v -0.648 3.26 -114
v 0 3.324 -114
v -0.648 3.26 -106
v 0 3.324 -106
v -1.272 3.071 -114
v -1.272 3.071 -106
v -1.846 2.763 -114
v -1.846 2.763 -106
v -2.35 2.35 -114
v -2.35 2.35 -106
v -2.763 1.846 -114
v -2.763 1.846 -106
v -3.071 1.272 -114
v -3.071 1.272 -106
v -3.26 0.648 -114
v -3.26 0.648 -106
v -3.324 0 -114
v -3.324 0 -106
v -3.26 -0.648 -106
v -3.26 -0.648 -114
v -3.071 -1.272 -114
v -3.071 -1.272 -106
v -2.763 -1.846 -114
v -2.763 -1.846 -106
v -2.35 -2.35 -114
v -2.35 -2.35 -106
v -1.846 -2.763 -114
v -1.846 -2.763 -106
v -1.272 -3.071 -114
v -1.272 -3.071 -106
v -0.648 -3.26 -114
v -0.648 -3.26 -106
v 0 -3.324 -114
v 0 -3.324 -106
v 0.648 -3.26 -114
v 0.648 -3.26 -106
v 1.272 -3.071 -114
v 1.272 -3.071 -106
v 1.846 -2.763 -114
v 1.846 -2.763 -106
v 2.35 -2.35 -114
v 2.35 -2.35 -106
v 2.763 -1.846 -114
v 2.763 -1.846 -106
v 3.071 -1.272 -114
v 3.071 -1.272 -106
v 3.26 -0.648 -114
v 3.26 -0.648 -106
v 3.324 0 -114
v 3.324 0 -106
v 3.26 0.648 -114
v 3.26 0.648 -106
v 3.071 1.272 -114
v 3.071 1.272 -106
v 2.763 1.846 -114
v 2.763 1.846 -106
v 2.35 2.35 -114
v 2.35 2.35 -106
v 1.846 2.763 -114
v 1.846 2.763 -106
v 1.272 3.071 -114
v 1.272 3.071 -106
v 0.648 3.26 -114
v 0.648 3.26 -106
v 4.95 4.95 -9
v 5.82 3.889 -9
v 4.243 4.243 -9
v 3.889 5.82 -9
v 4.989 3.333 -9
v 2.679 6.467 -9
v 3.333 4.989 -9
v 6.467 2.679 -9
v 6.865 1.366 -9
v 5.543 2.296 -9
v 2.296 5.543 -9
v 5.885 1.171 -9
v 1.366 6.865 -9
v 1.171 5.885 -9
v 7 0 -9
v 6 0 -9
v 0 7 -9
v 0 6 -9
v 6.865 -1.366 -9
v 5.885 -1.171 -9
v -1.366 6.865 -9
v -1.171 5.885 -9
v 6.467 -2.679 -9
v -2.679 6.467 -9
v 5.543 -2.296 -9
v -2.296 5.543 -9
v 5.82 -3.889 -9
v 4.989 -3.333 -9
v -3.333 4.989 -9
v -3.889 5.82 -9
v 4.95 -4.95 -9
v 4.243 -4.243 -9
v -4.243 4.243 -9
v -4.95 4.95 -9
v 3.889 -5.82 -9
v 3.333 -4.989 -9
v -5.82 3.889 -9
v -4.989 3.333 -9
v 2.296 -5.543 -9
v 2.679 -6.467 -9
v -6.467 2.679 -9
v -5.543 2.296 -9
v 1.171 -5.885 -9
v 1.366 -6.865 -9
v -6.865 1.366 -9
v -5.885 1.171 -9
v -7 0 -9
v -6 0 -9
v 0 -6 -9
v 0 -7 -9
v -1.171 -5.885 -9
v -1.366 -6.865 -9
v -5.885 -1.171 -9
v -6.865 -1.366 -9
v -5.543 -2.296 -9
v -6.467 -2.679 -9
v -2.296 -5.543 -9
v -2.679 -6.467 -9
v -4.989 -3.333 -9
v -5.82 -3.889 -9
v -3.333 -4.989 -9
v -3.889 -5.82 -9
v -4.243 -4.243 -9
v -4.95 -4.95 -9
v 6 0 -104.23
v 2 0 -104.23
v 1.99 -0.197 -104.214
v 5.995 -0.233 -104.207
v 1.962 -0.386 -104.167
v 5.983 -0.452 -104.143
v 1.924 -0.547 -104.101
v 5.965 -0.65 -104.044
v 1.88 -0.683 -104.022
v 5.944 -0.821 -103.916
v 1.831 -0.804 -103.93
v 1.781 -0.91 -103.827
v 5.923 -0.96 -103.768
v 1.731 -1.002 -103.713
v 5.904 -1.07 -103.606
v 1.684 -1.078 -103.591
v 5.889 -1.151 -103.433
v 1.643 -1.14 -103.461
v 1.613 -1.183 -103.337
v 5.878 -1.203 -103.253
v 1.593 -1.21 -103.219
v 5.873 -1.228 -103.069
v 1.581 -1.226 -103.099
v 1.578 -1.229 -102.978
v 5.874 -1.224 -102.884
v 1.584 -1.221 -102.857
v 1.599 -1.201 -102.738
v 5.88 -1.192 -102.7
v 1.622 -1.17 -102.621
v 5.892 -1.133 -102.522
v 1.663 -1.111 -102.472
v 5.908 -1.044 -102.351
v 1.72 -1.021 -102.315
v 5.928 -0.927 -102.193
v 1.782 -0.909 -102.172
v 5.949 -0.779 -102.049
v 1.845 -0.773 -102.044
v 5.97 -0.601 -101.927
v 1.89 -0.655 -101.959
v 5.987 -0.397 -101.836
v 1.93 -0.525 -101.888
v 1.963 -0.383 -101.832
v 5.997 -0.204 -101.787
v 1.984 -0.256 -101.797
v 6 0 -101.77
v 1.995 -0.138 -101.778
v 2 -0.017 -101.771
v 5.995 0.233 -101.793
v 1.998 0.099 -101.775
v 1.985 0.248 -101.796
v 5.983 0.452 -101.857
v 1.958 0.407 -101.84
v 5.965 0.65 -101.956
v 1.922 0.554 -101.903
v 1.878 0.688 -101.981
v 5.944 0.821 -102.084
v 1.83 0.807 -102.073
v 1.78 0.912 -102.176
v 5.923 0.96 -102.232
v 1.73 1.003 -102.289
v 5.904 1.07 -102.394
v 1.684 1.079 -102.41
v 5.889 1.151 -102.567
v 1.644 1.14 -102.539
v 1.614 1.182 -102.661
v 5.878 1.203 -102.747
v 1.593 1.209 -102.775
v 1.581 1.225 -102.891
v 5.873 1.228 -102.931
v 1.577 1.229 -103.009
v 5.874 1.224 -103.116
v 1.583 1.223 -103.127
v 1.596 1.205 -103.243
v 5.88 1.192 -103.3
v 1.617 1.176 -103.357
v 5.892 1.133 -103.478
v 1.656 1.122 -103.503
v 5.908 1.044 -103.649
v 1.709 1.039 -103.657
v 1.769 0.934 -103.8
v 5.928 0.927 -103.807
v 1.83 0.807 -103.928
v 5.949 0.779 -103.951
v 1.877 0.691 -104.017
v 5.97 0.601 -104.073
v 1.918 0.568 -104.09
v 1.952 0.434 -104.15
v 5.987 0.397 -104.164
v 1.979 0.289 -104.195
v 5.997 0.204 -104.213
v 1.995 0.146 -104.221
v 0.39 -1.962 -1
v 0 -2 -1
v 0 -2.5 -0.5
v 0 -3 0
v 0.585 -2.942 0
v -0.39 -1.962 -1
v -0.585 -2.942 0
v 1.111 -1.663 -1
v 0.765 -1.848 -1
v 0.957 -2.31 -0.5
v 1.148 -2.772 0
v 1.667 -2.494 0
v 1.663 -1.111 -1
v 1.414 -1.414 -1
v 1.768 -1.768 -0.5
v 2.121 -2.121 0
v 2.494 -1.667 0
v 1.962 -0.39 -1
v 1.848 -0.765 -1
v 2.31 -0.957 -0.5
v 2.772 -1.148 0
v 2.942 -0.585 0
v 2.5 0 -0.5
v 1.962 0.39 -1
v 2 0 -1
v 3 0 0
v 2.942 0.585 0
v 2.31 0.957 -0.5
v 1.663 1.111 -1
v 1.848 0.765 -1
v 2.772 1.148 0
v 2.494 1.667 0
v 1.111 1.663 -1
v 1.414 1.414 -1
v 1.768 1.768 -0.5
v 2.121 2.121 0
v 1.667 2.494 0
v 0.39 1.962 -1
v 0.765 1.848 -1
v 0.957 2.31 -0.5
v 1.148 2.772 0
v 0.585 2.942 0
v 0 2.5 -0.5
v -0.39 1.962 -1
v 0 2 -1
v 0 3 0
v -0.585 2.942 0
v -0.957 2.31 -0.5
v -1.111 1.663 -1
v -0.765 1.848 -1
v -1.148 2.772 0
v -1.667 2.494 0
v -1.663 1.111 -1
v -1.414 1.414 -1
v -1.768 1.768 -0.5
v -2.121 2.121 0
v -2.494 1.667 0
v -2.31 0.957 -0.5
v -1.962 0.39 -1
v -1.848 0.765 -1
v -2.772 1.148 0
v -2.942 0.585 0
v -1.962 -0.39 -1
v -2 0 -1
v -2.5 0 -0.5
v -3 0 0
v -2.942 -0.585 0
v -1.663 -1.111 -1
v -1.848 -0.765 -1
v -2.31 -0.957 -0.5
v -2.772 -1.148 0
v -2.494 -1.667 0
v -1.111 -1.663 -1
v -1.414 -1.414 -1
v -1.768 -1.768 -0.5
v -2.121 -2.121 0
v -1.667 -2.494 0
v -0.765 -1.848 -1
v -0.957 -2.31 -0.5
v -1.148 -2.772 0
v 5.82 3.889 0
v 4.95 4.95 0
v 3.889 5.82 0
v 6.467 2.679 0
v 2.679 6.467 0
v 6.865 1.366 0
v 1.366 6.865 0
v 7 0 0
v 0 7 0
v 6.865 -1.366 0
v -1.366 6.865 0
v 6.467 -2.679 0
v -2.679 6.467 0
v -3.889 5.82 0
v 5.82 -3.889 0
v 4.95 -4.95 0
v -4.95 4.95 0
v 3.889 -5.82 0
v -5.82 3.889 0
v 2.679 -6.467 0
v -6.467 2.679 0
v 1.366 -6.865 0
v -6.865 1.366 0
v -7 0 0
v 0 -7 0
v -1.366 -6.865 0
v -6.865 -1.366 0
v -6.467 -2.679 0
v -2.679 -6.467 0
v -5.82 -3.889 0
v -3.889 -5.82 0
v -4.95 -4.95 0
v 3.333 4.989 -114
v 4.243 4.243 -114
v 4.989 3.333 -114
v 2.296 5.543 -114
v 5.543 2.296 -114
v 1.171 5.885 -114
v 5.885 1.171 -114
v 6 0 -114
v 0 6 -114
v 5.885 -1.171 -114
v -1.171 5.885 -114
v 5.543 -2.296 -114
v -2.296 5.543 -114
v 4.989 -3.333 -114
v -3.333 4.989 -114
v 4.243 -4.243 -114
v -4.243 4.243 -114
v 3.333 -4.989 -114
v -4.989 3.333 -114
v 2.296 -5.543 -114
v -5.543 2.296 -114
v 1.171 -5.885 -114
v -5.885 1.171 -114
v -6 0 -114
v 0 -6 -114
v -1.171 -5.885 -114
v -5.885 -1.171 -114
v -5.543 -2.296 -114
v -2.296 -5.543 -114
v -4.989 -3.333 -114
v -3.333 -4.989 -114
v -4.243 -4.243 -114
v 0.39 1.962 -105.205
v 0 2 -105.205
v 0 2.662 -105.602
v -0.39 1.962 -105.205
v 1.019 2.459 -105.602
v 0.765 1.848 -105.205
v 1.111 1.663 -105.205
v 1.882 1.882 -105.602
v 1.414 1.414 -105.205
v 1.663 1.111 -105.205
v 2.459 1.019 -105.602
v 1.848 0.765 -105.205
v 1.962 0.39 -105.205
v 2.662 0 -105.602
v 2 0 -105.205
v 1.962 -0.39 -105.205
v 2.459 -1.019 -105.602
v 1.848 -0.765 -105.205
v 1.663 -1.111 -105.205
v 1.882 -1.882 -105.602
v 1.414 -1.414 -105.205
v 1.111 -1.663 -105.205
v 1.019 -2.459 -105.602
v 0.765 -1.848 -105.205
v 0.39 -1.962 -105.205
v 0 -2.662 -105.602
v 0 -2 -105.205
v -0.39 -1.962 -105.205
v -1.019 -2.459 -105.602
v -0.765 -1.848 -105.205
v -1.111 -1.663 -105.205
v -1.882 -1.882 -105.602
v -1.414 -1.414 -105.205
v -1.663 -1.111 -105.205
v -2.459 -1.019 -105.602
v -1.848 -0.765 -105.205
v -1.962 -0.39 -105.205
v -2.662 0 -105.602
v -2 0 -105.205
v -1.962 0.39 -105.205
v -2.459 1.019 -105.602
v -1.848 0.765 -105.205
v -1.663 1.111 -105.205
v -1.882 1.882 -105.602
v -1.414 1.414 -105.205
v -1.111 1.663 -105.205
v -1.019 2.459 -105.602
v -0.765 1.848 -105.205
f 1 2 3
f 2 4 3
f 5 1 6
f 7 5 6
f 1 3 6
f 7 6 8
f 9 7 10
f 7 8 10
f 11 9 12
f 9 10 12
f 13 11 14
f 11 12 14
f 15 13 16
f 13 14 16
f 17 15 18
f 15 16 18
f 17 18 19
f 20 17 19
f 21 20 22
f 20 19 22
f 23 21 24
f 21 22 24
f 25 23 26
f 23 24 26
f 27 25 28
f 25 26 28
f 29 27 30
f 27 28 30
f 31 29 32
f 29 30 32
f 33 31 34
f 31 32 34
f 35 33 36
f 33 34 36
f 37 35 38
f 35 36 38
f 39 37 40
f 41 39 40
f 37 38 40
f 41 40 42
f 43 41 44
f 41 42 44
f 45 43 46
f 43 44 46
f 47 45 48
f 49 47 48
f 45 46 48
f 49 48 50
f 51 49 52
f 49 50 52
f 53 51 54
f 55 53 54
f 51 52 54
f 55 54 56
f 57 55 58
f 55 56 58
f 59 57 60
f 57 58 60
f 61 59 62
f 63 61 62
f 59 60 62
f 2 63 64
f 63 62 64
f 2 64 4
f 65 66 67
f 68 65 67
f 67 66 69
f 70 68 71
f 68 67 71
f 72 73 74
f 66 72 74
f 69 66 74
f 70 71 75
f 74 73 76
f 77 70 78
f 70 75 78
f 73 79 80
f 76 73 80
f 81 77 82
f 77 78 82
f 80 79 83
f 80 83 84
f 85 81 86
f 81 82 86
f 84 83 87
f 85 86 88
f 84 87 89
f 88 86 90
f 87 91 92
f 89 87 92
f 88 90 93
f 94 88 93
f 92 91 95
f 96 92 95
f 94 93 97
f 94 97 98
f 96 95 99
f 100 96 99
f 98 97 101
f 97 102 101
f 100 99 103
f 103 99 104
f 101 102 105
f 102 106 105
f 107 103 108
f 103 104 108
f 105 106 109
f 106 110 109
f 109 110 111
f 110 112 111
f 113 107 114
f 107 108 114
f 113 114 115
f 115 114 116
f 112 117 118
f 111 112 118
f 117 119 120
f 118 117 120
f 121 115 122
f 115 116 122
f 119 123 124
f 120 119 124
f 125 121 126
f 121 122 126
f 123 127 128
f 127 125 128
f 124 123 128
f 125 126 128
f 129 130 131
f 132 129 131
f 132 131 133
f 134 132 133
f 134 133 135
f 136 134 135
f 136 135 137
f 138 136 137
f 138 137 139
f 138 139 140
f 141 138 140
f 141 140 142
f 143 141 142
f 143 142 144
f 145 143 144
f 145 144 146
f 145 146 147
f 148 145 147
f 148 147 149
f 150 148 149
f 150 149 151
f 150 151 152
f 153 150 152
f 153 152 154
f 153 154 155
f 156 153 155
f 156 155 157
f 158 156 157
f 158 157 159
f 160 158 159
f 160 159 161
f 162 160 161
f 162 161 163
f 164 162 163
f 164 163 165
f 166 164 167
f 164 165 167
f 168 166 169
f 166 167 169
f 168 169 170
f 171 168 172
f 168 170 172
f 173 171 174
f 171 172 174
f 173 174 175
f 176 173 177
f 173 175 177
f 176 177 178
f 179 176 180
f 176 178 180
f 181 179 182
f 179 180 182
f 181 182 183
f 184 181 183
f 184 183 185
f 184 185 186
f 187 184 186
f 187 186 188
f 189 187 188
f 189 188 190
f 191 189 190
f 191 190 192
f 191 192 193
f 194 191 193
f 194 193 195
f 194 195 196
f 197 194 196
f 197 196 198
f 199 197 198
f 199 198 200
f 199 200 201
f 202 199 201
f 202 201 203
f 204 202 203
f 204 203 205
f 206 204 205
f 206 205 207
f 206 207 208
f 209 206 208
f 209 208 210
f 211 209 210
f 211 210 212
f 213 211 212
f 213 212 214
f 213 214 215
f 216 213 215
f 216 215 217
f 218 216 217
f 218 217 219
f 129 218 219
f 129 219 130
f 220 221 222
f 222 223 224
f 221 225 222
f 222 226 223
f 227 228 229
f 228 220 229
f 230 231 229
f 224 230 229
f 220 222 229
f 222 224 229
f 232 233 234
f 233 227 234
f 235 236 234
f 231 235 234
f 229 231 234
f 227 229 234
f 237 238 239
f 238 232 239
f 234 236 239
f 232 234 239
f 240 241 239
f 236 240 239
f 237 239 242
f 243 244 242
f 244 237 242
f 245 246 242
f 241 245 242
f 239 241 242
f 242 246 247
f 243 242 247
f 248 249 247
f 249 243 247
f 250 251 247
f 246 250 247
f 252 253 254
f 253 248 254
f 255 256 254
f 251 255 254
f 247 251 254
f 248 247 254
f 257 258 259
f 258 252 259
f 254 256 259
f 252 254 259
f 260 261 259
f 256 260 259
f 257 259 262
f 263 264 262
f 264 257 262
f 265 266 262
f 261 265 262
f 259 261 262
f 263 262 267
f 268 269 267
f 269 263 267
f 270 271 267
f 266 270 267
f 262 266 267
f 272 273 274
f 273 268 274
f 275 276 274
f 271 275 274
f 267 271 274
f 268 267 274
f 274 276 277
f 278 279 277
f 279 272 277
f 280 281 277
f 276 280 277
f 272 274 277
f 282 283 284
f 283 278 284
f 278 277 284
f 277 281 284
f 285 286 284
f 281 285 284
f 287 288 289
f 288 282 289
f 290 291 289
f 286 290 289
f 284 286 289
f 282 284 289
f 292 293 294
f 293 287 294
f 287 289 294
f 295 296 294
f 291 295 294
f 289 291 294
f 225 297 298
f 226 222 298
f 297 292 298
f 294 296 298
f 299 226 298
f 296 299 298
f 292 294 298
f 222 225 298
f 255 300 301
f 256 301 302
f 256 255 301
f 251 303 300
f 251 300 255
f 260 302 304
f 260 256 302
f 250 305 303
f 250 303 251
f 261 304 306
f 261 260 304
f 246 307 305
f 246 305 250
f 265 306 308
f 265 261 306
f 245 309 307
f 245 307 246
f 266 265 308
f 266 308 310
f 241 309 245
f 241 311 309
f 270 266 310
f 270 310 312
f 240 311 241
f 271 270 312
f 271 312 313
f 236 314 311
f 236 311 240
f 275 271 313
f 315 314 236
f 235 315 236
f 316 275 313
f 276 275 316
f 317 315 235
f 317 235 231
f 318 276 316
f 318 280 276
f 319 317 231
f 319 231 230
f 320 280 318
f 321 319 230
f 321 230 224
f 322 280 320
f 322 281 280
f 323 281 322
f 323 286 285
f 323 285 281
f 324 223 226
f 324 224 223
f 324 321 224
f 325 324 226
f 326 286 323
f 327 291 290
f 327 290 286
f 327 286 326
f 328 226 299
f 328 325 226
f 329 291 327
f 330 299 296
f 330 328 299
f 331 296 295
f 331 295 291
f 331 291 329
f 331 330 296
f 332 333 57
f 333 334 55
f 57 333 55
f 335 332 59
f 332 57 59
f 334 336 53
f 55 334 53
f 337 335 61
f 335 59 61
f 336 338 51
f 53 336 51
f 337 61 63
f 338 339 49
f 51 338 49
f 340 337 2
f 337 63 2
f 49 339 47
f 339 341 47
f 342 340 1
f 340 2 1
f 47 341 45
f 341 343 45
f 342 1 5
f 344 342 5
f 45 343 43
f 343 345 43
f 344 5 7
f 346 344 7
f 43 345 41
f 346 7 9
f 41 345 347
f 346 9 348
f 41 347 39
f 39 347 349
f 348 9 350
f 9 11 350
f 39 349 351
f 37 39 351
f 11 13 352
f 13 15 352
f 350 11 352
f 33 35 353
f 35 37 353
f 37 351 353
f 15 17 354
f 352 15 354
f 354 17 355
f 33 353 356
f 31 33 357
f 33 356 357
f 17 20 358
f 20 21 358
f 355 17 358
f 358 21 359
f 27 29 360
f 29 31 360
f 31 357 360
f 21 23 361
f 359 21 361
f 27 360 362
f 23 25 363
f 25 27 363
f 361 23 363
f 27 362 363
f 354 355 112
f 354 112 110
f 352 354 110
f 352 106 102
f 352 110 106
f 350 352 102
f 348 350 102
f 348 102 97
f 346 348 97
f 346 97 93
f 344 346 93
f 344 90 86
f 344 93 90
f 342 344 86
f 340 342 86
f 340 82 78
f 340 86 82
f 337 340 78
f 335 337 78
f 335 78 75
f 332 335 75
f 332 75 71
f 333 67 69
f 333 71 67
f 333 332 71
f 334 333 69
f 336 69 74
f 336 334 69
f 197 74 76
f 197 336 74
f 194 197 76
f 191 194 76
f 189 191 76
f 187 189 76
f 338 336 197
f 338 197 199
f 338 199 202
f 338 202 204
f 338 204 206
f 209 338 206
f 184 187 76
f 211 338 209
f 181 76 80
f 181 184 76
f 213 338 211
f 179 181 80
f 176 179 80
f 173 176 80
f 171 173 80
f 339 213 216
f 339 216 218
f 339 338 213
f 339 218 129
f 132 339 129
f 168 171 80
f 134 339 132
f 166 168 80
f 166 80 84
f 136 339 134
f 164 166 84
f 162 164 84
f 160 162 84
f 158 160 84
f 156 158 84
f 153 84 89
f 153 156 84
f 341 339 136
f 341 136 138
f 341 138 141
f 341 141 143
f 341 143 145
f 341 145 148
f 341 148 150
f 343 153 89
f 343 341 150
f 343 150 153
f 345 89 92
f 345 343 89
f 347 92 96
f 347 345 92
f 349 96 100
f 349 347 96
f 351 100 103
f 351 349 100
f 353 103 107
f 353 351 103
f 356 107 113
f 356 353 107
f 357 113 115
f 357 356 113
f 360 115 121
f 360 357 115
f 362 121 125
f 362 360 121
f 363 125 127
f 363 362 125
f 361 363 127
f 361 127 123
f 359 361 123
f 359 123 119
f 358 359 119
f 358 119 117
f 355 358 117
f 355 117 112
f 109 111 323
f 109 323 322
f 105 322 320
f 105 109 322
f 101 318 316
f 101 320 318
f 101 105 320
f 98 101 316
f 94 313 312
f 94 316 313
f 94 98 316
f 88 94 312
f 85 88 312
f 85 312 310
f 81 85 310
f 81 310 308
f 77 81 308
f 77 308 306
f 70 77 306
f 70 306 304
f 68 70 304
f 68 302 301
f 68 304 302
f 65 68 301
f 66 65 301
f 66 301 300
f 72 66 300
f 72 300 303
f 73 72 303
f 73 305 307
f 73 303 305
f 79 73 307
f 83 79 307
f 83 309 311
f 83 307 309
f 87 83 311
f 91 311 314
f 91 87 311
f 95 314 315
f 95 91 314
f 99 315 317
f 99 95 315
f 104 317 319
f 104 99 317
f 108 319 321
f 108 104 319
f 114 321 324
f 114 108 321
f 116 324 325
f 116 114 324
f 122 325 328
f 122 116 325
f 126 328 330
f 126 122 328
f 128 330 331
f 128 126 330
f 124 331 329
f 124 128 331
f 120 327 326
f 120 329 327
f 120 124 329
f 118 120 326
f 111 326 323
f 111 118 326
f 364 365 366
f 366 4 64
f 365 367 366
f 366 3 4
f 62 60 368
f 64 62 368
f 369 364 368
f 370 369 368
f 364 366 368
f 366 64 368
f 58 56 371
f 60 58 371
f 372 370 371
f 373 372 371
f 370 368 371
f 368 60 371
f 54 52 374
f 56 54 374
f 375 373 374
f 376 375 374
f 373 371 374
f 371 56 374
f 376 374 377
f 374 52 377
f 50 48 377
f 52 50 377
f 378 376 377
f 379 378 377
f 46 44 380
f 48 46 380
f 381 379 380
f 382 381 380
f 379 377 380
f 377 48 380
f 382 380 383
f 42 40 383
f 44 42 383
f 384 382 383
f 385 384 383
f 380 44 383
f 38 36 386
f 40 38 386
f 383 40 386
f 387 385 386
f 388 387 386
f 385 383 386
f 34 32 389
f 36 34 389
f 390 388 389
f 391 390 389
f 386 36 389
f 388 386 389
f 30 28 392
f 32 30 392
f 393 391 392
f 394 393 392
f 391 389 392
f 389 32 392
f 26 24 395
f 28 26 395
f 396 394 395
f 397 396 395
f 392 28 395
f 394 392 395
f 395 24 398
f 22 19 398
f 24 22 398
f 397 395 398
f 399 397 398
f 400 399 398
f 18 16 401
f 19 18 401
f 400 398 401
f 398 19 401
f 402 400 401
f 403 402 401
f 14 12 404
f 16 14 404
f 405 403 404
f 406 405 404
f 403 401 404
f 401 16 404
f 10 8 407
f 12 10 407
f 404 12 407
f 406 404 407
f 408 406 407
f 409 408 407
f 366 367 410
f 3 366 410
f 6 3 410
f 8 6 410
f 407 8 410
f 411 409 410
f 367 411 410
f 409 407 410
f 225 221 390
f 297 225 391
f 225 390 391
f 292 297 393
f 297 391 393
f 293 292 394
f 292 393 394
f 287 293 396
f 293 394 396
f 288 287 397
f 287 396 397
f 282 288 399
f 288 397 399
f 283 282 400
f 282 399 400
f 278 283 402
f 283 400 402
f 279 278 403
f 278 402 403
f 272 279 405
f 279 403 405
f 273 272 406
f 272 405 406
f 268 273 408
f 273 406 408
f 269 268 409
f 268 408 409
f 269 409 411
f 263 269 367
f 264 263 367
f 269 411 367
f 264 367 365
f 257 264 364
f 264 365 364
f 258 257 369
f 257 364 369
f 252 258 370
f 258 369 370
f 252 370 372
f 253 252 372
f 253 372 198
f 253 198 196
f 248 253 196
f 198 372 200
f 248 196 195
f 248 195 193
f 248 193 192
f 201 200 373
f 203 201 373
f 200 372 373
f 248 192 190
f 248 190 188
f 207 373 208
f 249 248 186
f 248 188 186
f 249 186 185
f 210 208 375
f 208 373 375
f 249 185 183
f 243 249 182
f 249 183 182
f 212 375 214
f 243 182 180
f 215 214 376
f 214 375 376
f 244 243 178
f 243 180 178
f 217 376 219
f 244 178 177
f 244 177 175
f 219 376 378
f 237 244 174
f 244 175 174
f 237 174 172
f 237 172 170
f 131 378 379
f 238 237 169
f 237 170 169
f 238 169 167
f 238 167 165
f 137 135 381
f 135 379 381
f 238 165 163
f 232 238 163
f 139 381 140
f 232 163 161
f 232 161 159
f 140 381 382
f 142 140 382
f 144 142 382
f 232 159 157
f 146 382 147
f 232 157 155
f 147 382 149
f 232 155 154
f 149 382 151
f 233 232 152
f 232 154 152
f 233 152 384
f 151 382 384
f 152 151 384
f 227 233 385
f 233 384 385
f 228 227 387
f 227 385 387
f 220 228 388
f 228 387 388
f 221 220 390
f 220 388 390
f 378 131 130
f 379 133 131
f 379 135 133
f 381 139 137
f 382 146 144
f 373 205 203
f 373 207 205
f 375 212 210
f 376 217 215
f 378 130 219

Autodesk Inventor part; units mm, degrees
ref_plane "XZ Plane" through (0, 0, 0) normal (0, 1, 0) x (-1, 0, 0)
ref_plane "XY Plane" through (0, 0, 0) normal (0, 0, 1) x (1, 0, 0)
sketch "Skizze1" plane through (0, 0, 0) normal (0, 1, 0) x (-1, 0, 0)
  line L0 (0, 0) -> (7, 0)
  line L1 (7, 0) -> (7, -9)
  line L2 (7, -9) -> (6, -9)
  line L3 (6, -9) -> (6, -114)
  line L4 (6, -114) -> (0, -114)
  line L5 (0, -114) -> (0, 0)
  dimension "d0" = 7
  dimension "d1" = 6
  dimension "d2" = 9
  dimension "d3" = 105
revolve "Umdrehung2" add sketch "Skizze1" angle 360 about axis through (0, 0, -114) along (0, 0, 1)
sketch "Skizze3" plane through (0, 0, -114) normal (0, 0, -1) x (-1, 0, 0)
  point P0 (0, 0)
  point P1 (0, 0)
hole "Bohrung2" at (0, 0, -114) direction (0, 0, 1) diameter 6.647 depth 8 tip angle 118 thread size "M8x1.25" class "6H" standard "ISO Metric profile"
sketch "Skizze4" plane through (0, 0, 0) normal (0, 0, 1) x (1, 0, 0)
  circle A0 centre (0, 0) radius 3.3235 projected
  point P0 (0, 0)
hole "Bohrung3" at (0, 0, 0) direction (0, 0, -1) diameter 4 end through all
chamfer "Fase2" distance 1 angle 45 1 edges at (0, 2, 0)
ref_plane "Arbeitsebene2" through (6, 0, 0) normal (1, 0, 0) x (0, 1, 0)
sketch "Skizze5" plane through (6, 0, 0) normal (1, 0, 0) x (0, 1, 0)
  line L0 (-6, -114) -> (6, -114) projected
  line L1 (0, 0) -> (0, -114)
  point P0 (0, -103)
  dimension "d39" = 11
hole "Bohrung4" at (6, 0, -103) direction (-1, 0, 0) diameter 2.459 end up to surface thread size "M3x0.5" class "6H" standard "ISO Metric profile"
properties part number "Glashalter"
